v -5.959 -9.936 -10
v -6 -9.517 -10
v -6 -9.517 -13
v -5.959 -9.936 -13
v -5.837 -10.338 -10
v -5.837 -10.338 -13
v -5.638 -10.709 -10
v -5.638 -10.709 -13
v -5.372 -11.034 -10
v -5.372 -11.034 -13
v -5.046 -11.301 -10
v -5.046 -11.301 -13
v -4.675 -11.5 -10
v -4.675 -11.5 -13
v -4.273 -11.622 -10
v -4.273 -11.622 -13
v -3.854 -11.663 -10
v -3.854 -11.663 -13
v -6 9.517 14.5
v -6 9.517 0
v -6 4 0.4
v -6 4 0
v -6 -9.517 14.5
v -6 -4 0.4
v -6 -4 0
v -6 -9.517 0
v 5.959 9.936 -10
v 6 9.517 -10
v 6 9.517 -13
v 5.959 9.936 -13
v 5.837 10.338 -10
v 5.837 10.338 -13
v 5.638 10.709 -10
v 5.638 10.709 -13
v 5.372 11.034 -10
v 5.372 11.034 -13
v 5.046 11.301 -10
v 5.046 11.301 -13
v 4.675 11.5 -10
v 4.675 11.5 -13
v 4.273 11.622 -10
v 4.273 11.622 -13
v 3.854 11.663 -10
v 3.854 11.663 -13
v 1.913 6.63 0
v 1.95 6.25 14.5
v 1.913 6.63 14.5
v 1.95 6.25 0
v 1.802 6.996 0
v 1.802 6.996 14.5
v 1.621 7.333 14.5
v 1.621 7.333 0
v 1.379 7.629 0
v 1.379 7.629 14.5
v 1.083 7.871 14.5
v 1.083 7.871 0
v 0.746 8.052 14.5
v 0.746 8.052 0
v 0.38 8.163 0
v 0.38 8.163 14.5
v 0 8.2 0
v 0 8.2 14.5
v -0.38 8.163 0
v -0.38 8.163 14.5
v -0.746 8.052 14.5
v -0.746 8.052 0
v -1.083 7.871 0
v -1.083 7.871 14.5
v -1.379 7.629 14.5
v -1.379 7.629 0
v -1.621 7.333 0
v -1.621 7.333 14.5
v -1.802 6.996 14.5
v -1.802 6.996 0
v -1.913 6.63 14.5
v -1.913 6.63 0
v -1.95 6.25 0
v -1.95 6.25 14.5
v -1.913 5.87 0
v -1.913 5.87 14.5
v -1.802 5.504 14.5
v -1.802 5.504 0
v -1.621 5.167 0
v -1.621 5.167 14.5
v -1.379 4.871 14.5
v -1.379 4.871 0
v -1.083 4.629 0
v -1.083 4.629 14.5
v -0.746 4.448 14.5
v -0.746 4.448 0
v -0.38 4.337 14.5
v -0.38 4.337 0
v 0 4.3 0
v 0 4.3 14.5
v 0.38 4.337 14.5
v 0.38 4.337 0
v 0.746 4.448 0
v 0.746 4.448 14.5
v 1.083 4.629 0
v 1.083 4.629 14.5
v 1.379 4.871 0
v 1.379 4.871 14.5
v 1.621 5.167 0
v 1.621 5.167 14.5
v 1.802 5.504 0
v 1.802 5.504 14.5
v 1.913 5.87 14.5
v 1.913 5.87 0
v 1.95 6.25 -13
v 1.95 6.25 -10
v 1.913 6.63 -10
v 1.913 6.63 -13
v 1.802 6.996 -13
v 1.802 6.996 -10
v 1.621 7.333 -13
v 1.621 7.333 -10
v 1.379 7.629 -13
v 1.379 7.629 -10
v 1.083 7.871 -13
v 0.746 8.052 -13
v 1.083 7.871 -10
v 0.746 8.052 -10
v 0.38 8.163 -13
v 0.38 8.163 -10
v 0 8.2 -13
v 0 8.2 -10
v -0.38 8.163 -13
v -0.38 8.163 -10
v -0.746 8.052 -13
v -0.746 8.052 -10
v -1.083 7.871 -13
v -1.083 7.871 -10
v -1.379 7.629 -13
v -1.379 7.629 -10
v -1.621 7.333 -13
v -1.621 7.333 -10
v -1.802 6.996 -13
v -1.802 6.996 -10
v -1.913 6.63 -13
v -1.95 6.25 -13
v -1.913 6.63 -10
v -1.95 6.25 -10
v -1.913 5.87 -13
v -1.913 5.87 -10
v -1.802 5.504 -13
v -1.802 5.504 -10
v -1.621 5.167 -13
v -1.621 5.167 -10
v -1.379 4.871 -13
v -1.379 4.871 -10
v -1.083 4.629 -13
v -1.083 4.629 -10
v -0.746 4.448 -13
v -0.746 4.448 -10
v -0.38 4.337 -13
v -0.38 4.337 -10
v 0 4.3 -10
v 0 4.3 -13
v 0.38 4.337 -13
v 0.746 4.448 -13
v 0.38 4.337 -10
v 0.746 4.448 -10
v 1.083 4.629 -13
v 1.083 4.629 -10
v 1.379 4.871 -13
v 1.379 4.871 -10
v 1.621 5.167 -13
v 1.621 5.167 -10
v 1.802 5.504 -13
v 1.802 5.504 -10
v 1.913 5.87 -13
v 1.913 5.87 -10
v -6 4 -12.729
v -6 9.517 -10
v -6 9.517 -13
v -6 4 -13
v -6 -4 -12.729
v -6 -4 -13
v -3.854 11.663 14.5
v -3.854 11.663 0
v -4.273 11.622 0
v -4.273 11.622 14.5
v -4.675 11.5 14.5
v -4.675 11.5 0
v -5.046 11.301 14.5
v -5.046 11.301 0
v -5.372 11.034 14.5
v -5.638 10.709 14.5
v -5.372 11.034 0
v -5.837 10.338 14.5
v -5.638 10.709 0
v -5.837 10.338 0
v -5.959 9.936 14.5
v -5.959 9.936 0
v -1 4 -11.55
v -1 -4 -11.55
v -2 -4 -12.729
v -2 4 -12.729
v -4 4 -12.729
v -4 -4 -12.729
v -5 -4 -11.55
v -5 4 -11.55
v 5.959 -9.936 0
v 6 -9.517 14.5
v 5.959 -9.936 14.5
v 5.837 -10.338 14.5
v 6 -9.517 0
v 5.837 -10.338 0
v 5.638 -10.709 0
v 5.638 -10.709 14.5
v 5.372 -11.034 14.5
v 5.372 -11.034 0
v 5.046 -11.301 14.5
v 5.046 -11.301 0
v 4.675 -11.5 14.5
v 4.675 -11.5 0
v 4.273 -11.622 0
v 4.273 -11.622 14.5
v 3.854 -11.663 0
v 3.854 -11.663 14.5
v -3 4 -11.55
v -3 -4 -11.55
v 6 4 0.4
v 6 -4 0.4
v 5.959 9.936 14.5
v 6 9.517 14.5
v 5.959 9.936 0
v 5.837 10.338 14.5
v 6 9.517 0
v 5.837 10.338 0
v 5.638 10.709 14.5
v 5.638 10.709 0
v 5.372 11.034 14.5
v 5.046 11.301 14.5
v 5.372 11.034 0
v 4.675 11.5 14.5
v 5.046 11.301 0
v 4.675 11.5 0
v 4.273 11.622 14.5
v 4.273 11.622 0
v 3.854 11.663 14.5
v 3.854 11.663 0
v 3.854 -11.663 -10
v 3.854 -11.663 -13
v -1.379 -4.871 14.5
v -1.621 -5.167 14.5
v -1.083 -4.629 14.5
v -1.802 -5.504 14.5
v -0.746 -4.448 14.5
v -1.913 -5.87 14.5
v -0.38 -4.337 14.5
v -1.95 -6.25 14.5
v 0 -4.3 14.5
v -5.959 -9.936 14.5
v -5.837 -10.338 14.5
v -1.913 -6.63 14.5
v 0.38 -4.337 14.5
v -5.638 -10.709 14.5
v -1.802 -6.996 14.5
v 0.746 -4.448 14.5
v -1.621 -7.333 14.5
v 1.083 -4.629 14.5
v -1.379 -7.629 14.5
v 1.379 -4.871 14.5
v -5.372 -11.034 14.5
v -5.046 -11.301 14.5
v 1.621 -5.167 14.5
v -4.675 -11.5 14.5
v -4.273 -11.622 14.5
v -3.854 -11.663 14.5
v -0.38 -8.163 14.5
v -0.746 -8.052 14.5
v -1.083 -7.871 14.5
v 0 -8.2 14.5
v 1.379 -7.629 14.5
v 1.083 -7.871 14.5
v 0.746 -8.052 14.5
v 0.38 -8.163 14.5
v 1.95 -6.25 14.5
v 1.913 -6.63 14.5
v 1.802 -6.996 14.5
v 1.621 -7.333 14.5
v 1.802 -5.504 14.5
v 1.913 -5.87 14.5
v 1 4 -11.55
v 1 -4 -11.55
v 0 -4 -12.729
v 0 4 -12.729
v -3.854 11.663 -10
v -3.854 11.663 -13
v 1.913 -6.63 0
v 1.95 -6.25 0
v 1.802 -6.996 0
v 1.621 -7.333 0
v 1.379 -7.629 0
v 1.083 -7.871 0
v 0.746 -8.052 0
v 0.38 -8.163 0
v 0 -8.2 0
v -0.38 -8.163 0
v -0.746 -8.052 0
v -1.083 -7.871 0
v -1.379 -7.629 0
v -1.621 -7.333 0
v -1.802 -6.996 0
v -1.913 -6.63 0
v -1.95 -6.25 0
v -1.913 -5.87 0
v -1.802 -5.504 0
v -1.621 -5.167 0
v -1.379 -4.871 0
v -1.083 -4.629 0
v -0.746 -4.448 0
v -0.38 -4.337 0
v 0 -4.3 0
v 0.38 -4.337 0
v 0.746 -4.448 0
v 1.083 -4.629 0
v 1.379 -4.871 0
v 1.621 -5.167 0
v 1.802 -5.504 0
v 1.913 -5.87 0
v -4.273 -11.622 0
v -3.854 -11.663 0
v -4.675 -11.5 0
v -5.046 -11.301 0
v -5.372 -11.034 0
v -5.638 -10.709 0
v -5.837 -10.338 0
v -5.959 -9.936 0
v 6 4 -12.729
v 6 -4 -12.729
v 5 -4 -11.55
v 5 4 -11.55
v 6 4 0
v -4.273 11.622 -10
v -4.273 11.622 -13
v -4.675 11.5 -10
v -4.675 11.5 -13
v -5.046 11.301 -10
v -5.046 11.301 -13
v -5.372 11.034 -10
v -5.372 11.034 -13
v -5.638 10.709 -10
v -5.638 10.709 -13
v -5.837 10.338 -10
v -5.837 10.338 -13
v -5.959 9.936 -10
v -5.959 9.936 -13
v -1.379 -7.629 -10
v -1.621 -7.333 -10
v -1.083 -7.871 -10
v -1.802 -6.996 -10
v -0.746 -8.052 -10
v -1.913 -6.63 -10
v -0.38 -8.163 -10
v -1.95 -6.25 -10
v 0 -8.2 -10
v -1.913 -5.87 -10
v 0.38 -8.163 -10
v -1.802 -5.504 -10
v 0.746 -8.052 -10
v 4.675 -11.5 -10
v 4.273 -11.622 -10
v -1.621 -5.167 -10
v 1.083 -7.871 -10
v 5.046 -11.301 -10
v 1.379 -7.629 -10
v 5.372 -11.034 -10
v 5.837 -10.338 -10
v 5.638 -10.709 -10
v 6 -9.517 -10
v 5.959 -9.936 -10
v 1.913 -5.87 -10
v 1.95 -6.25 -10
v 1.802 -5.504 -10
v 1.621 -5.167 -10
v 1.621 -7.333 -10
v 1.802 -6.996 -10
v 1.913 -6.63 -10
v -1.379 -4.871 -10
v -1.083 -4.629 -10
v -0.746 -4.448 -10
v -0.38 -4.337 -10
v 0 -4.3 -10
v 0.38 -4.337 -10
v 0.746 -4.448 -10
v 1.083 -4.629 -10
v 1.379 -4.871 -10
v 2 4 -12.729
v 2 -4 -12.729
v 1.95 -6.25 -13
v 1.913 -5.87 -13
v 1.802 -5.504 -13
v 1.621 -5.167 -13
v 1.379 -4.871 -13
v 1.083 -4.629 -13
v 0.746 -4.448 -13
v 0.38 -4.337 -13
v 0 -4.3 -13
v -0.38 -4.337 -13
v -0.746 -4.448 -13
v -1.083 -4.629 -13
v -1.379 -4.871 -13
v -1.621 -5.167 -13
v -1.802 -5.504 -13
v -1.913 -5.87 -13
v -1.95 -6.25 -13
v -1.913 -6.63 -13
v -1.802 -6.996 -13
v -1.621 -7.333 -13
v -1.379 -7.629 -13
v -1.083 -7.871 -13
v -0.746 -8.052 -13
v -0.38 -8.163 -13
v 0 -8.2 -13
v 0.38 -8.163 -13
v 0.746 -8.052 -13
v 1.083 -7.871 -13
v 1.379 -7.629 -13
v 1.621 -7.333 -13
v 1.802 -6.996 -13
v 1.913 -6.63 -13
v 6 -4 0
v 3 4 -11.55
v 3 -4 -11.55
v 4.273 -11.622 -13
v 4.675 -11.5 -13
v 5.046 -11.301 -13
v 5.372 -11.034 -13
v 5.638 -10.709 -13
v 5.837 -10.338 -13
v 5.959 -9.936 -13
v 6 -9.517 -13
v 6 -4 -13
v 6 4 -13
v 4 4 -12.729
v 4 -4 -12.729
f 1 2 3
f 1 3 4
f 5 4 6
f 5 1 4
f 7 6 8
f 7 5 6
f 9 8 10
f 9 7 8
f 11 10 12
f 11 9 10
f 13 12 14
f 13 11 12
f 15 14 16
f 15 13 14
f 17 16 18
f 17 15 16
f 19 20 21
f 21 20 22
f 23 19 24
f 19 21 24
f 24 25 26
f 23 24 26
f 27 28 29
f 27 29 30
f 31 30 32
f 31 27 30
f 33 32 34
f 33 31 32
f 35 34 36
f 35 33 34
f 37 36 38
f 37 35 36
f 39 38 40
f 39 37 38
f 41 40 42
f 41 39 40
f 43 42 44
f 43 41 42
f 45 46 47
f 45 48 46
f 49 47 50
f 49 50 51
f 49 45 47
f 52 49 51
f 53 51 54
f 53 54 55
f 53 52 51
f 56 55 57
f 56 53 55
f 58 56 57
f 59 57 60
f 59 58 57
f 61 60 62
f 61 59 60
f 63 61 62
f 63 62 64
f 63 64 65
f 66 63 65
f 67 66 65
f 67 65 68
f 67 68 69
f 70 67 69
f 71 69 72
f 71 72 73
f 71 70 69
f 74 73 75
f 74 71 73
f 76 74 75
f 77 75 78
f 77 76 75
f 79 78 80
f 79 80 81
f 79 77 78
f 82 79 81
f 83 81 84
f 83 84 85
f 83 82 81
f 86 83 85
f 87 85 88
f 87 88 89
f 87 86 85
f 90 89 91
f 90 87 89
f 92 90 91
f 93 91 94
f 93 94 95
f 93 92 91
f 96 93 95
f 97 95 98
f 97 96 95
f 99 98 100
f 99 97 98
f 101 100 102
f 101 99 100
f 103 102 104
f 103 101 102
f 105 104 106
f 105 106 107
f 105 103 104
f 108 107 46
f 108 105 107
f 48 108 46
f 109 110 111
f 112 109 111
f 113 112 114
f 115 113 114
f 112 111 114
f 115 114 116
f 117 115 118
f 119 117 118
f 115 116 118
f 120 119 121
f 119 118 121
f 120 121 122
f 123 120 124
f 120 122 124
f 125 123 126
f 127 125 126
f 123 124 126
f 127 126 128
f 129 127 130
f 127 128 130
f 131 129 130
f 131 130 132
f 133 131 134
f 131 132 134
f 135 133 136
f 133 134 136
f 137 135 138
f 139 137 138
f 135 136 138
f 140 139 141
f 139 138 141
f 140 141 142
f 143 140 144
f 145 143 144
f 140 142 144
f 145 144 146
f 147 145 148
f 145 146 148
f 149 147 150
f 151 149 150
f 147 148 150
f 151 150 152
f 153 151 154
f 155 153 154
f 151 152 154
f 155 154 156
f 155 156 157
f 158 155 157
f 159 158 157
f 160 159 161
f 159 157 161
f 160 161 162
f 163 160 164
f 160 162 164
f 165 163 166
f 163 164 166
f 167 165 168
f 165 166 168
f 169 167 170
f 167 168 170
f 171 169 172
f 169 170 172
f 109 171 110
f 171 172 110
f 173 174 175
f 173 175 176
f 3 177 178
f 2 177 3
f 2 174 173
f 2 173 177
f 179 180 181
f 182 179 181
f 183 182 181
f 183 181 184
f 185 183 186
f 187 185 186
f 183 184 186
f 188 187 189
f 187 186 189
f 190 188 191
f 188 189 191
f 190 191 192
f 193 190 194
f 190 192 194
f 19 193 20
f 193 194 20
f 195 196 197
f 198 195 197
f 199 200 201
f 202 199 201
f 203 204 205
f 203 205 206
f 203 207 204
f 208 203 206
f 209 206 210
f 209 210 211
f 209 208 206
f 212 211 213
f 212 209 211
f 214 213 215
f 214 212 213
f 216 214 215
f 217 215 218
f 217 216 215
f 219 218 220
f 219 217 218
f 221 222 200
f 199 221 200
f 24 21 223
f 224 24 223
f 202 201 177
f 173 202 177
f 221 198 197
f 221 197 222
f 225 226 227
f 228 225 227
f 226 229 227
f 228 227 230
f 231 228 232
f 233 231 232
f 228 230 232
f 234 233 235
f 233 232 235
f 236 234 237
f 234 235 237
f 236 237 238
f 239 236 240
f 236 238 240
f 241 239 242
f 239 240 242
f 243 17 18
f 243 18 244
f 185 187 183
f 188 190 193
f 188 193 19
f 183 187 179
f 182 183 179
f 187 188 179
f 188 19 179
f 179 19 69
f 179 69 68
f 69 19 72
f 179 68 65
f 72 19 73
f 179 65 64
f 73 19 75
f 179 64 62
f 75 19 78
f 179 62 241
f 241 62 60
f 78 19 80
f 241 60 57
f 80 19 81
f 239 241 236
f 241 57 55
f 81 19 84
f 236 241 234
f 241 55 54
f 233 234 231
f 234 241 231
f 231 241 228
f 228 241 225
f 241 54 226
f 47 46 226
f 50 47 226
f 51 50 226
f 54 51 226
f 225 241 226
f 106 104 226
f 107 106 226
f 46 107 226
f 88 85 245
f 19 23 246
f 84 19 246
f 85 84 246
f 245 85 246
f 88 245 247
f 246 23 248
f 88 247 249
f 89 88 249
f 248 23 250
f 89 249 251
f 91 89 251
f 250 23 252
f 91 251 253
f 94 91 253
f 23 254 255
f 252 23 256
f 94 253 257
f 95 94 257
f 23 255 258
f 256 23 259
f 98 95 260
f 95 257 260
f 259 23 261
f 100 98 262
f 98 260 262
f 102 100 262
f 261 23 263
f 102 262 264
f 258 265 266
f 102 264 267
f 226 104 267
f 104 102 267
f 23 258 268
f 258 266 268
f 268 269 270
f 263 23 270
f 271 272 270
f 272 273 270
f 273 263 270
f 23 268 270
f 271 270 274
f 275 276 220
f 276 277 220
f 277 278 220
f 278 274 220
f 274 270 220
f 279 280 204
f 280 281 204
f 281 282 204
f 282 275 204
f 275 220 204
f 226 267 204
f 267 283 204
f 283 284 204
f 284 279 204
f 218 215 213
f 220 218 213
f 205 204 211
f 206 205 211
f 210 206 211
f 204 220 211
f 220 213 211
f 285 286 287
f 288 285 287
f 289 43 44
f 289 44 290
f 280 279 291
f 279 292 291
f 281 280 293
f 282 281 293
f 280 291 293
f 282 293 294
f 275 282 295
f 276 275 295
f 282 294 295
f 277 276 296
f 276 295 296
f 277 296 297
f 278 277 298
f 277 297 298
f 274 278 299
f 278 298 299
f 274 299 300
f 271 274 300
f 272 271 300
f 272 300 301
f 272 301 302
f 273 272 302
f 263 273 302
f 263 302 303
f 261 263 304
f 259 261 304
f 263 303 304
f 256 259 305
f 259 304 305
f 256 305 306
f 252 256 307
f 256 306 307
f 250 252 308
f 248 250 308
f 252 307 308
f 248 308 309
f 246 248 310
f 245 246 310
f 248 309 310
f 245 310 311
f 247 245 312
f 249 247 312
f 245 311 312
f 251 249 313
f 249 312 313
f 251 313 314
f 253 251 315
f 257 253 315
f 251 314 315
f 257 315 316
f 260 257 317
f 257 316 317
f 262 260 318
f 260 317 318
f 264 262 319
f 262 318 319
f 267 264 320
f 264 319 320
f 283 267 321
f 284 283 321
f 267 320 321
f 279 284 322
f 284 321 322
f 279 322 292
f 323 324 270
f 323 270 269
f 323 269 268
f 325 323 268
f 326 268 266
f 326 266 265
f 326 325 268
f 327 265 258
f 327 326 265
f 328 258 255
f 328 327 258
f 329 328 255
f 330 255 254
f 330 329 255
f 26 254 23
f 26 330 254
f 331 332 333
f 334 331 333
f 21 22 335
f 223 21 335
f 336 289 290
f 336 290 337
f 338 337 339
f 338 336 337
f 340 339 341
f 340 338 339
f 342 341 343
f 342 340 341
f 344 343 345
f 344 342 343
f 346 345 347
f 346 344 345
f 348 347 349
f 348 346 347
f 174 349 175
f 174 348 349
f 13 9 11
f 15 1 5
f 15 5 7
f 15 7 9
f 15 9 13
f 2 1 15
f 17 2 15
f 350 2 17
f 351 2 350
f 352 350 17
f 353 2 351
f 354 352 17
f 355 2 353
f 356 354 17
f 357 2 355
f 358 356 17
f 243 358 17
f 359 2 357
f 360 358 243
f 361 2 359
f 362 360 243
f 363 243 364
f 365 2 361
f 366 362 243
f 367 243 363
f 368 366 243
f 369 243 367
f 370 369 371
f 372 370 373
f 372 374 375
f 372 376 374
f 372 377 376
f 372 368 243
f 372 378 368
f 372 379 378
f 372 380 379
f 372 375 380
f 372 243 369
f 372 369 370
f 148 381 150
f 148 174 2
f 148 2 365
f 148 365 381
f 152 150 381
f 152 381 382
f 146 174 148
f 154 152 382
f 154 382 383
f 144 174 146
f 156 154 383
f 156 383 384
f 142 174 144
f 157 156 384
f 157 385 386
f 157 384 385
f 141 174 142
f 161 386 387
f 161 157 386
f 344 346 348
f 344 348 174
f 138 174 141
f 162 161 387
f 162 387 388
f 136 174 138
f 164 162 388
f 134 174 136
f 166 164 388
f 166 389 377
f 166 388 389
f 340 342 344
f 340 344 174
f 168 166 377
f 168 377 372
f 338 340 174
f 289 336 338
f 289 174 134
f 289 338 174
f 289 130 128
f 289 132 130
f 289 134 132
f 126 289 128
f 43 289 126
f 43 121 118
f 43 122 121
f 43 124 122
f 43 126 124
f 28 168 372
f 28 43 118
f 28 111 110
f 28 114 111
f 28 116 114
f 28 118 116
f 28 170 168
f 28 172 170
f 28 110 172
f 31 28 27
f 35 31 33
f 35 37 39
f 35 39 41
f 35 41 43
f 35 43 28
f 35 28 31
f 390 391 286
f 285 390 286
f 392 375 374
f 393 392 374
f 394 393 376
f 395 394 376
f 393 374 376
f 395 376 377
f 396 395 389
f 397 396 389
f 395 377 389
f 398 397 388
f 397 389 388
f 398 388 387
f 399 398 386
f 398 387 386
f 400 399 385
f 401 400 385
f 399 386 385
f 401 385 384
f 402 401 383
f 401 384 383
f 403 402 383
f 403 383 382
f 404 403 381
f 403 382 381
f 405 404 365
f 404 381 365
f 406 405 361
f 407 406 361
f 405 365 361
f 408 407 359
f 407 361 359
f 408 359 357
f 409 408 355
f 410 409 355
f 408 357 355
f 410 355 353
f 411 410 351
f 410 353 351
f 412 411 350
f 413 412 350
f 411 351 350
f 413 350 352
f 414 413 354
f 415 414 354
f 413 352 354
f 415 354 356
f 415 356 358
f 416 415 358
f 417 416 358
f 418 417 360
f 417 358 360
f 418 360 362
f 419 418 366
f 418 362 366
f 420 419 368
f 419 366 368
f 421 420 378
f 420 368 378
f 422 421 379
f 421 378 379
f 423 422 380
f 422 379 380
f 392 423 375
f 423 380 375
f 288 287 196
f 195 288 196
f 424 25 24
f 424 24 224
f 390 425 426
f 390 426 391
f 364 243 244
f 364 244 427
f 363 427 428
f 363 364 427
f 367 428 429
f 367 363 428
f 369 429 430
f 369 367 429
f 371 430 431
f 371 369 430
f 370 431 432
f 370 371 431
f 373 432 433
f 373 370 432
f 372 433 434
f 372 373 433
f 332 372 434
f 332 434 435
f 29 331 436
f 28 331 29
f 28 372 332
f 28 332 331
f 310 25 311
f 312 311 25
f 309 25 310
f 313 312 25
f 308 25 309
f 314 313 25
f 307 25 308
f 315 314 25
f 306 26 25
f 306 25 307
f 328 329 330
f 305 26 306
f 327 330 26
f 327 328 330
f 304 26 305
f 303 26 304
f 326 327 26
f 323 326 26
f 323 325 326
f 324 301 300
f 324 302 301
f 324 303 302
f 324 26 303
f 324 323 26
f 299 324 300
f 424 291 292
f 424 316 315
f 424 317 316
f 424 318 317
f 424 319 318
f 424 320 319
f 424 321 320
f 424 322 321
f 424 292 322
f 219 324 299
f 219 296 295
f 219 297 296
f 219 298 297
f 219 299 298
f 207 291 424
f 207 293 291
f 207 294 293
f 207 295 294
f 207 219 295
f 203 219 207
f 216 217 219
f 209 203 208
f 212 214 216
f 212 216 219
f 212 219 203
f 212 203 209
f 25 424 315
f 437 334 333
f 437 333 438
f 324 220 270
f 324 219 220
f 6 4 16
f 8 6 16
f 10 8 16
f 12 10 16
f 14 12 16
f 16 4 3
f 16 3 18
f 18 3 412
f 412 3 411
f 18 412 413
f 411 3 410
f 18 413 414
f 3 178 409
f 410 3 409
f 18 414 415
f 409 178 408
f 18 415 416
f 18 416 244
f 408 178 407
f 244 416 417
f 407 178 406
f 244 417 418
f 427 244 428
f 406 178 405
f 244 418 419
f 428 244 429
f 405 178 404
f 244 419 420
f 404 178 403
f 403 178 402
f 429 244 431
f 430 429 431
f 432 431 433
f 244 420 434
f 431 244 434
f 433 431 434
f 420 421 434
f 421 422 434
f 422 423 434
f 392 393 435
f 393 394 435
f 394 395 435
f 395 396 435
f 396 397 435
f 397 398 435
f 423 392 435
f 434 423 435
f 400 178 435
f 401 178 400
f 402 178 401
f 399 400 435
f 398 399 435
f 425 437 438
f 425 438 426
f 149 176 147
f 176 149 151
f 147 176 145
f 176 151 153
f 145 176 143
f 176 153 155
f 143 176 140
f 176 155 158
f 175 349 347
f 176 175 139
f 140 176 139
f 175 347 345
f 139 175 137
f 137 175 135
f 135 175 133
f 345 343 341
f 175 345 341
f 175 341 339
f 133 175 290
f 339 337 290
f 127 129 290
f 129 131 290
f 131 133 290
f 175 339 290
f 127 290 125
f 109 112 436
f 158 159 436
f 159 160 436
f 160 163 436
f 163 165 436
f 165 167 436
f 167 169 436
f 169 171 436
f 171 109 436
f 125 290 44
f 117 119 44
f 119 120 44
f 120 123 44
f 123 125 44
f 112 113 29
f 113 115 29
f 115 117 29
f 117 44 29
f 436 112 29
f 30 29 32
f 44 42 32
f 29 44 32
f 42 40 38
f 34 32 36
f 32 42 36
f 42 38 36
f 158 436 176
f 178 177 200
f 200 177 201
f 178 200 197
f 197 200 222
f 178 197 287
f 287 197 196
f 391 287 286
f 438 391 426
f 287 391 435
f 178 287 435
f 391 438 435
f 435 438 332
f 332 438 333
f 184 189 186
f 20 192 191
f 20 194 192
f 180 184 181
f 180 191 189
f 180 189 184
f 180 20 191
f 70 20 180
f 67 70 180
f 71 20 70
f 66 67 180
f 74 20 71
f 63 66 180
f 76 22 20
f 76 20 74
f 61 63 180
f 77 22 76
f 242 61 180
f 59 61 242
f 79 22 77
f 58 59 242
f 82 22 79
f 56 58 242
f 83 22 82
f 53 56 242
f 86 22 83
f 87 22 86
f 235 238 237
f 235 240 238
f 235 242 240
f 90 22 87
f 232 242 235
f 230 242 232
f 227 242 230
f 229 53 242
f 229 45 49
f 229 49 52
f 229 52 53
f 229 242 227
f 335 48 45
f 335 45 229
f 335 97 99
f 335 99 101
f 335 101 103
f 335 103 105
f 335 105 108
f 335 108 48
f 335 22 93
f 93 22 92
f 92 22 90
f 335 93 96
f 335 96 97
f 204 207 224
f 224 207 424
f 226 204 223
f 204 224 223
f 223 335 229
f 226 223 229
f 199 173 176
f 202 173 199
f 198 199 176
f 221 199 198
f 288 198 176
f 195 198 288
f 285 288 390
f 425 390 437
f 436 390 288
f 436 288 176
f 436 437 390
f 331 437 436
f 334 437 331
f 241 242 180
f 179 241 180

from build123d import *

# Parameters (mm, degrees)
F0_R          = 1.95
F1_DEPTH      = 6.5
F4_R          = 1.95
F5_DEPTH      = 3
F7_DEPTH      = 4
F7_DEPTH_BACK = 4
F8_W          = 12
F8_H          = 4
F9_DEPTH      = 0.4
F10_DEPTH     = 8


with BuildPart() as f1:
    # F0 (on Top) → F1 (new body)
    with BuildSketch(Plane.XY):
        with BuildLine():
            Line((3.854228543, 11.6629619151), (-3.854228543, 11.6629619151))
            ThreePointArc((-3.854228543, 11.6629619151), (-5.3715180911, 11.0344800063), (-6, 9.5171904582))
            Line((-6, 9.5171904582), (-6, 0))
            Line((-6, 0), (6, 0))
            Line((6, 0), (6, 9.5171904582))
            ThreePointArc((6, 9.5171904582), (5.3715180911, 11.0344800063), (3.854228543, 11.6629619151))
        make_face()
        with Locations((0, 6.25)):
            Circle(F0_R, mode=Mode.SUBTRACT)
    extrude(amount=F1_DEPTH)

    # F2: F1 across plane


with BuildPart() as f1_1:
    add(f1.part)
    add(f1.part.mirror(Plane.XZ))

    # F8 (on Top) → F9 (cut)
    with BuildSketch(Plane.XY):
        with Locations((0, 2)):
            Rectangle(F8_W, F8_H)
        with Locations((0, -2)):
            Rectangle(F8_W, F8_H)
    extrude(amount=F9_DEPTH, mode=Mode.SUBTRACT)

    # F10 (add): a face of the model
    f10_faces = [f1_1.faces().sort_by_distance(p)[0] for p in [
        (0, 0, 6.5),
    ]]
    extrude(f10_faces, amount=F10_DEPTH)


with BuildPart() as f5:
    # F4 (on offset) → F5 (new body)
    with BuildSketch(Plane.XY.offset(-10)):
        with BuildLine():
            ThreePointArc((-3.854228543, 11.6629619151), (-5.3715180911, 11.0344800063), (-6, 9.5171904582))
            Line((-6, 9.5171904582), (-6, -9.5171904582))
            ThreePointArc((-6, -9.5171904582), (-5.3715180911, -11.0344800063), (-3.854228543, -11.6629619151))
            Line((-3.854228543, -11.6629619151), (3.854228543, -11.6629619151))
            ThreePointArc((3.854228543, -11.6629619151), (5.3715180911, -11.0344800063), (6, -9.5171904582))
            Line((6, -9.5171904582), (6, 9.5171904582))
            ThreePointArc((6, 9.5171904582), (5.3715180911, 11.0344800063), (3.854228543, 11.6629619151))
            Line((3.854228543, 11.6629619151), (-3.854228543, 11.6629619151))
        make_face()
        with Locations((0, -6.25)):
            Circle(F4_R, mode=Mode.SUBTRACT)
        with Locations((0, 6.25)):
            Circle(F4_R, mode=Mode.SUBTRACT)
    extrude(amount=-F5_DEPTH)

    # F6 (on Front) → F7 (cut, two sides)
    with BuildSketch(Plane.XZ) as f7_sk:
        Polygon((-6, -12.7287376672), (-6, -13), (-4, -13), (-4, -12.7287376672), (-5, -11.55), align=None)
        Polygon((-4, -12.7287376672), (-4, -13), (-2, -13), (-2, -12.7287376672), (-3, -11.55), align=None)
        Polygon((-2, -12.7287376672), (-2, -13), (0, -13), (0, -12.7287376672), (-1, -11.55), align=None)
        Polygon((0, -12.7287376672), (0, -13), (2, -13), (2, -12.7287376672), (1, -11.55), align=None)
        Polygon((2, -12.7287376672), (2, -13), (4, -13), (4, -12.7287376672), (3, -11.55), align=None)
        Polygon((4, -12.7287376672), (4, -13), (6, -13), (6, -12.7287376672), (5, -11.55), align=None)
    extrude(amount=-F7_DEPTH, mode=Mode.SUBTRACT)
    extrude(f7_sk.sketch, amount=F7_DEPTH_BACK, mode=Mode.SUBTRACT)


solid = Compound([f1_1.part, f5.part])
